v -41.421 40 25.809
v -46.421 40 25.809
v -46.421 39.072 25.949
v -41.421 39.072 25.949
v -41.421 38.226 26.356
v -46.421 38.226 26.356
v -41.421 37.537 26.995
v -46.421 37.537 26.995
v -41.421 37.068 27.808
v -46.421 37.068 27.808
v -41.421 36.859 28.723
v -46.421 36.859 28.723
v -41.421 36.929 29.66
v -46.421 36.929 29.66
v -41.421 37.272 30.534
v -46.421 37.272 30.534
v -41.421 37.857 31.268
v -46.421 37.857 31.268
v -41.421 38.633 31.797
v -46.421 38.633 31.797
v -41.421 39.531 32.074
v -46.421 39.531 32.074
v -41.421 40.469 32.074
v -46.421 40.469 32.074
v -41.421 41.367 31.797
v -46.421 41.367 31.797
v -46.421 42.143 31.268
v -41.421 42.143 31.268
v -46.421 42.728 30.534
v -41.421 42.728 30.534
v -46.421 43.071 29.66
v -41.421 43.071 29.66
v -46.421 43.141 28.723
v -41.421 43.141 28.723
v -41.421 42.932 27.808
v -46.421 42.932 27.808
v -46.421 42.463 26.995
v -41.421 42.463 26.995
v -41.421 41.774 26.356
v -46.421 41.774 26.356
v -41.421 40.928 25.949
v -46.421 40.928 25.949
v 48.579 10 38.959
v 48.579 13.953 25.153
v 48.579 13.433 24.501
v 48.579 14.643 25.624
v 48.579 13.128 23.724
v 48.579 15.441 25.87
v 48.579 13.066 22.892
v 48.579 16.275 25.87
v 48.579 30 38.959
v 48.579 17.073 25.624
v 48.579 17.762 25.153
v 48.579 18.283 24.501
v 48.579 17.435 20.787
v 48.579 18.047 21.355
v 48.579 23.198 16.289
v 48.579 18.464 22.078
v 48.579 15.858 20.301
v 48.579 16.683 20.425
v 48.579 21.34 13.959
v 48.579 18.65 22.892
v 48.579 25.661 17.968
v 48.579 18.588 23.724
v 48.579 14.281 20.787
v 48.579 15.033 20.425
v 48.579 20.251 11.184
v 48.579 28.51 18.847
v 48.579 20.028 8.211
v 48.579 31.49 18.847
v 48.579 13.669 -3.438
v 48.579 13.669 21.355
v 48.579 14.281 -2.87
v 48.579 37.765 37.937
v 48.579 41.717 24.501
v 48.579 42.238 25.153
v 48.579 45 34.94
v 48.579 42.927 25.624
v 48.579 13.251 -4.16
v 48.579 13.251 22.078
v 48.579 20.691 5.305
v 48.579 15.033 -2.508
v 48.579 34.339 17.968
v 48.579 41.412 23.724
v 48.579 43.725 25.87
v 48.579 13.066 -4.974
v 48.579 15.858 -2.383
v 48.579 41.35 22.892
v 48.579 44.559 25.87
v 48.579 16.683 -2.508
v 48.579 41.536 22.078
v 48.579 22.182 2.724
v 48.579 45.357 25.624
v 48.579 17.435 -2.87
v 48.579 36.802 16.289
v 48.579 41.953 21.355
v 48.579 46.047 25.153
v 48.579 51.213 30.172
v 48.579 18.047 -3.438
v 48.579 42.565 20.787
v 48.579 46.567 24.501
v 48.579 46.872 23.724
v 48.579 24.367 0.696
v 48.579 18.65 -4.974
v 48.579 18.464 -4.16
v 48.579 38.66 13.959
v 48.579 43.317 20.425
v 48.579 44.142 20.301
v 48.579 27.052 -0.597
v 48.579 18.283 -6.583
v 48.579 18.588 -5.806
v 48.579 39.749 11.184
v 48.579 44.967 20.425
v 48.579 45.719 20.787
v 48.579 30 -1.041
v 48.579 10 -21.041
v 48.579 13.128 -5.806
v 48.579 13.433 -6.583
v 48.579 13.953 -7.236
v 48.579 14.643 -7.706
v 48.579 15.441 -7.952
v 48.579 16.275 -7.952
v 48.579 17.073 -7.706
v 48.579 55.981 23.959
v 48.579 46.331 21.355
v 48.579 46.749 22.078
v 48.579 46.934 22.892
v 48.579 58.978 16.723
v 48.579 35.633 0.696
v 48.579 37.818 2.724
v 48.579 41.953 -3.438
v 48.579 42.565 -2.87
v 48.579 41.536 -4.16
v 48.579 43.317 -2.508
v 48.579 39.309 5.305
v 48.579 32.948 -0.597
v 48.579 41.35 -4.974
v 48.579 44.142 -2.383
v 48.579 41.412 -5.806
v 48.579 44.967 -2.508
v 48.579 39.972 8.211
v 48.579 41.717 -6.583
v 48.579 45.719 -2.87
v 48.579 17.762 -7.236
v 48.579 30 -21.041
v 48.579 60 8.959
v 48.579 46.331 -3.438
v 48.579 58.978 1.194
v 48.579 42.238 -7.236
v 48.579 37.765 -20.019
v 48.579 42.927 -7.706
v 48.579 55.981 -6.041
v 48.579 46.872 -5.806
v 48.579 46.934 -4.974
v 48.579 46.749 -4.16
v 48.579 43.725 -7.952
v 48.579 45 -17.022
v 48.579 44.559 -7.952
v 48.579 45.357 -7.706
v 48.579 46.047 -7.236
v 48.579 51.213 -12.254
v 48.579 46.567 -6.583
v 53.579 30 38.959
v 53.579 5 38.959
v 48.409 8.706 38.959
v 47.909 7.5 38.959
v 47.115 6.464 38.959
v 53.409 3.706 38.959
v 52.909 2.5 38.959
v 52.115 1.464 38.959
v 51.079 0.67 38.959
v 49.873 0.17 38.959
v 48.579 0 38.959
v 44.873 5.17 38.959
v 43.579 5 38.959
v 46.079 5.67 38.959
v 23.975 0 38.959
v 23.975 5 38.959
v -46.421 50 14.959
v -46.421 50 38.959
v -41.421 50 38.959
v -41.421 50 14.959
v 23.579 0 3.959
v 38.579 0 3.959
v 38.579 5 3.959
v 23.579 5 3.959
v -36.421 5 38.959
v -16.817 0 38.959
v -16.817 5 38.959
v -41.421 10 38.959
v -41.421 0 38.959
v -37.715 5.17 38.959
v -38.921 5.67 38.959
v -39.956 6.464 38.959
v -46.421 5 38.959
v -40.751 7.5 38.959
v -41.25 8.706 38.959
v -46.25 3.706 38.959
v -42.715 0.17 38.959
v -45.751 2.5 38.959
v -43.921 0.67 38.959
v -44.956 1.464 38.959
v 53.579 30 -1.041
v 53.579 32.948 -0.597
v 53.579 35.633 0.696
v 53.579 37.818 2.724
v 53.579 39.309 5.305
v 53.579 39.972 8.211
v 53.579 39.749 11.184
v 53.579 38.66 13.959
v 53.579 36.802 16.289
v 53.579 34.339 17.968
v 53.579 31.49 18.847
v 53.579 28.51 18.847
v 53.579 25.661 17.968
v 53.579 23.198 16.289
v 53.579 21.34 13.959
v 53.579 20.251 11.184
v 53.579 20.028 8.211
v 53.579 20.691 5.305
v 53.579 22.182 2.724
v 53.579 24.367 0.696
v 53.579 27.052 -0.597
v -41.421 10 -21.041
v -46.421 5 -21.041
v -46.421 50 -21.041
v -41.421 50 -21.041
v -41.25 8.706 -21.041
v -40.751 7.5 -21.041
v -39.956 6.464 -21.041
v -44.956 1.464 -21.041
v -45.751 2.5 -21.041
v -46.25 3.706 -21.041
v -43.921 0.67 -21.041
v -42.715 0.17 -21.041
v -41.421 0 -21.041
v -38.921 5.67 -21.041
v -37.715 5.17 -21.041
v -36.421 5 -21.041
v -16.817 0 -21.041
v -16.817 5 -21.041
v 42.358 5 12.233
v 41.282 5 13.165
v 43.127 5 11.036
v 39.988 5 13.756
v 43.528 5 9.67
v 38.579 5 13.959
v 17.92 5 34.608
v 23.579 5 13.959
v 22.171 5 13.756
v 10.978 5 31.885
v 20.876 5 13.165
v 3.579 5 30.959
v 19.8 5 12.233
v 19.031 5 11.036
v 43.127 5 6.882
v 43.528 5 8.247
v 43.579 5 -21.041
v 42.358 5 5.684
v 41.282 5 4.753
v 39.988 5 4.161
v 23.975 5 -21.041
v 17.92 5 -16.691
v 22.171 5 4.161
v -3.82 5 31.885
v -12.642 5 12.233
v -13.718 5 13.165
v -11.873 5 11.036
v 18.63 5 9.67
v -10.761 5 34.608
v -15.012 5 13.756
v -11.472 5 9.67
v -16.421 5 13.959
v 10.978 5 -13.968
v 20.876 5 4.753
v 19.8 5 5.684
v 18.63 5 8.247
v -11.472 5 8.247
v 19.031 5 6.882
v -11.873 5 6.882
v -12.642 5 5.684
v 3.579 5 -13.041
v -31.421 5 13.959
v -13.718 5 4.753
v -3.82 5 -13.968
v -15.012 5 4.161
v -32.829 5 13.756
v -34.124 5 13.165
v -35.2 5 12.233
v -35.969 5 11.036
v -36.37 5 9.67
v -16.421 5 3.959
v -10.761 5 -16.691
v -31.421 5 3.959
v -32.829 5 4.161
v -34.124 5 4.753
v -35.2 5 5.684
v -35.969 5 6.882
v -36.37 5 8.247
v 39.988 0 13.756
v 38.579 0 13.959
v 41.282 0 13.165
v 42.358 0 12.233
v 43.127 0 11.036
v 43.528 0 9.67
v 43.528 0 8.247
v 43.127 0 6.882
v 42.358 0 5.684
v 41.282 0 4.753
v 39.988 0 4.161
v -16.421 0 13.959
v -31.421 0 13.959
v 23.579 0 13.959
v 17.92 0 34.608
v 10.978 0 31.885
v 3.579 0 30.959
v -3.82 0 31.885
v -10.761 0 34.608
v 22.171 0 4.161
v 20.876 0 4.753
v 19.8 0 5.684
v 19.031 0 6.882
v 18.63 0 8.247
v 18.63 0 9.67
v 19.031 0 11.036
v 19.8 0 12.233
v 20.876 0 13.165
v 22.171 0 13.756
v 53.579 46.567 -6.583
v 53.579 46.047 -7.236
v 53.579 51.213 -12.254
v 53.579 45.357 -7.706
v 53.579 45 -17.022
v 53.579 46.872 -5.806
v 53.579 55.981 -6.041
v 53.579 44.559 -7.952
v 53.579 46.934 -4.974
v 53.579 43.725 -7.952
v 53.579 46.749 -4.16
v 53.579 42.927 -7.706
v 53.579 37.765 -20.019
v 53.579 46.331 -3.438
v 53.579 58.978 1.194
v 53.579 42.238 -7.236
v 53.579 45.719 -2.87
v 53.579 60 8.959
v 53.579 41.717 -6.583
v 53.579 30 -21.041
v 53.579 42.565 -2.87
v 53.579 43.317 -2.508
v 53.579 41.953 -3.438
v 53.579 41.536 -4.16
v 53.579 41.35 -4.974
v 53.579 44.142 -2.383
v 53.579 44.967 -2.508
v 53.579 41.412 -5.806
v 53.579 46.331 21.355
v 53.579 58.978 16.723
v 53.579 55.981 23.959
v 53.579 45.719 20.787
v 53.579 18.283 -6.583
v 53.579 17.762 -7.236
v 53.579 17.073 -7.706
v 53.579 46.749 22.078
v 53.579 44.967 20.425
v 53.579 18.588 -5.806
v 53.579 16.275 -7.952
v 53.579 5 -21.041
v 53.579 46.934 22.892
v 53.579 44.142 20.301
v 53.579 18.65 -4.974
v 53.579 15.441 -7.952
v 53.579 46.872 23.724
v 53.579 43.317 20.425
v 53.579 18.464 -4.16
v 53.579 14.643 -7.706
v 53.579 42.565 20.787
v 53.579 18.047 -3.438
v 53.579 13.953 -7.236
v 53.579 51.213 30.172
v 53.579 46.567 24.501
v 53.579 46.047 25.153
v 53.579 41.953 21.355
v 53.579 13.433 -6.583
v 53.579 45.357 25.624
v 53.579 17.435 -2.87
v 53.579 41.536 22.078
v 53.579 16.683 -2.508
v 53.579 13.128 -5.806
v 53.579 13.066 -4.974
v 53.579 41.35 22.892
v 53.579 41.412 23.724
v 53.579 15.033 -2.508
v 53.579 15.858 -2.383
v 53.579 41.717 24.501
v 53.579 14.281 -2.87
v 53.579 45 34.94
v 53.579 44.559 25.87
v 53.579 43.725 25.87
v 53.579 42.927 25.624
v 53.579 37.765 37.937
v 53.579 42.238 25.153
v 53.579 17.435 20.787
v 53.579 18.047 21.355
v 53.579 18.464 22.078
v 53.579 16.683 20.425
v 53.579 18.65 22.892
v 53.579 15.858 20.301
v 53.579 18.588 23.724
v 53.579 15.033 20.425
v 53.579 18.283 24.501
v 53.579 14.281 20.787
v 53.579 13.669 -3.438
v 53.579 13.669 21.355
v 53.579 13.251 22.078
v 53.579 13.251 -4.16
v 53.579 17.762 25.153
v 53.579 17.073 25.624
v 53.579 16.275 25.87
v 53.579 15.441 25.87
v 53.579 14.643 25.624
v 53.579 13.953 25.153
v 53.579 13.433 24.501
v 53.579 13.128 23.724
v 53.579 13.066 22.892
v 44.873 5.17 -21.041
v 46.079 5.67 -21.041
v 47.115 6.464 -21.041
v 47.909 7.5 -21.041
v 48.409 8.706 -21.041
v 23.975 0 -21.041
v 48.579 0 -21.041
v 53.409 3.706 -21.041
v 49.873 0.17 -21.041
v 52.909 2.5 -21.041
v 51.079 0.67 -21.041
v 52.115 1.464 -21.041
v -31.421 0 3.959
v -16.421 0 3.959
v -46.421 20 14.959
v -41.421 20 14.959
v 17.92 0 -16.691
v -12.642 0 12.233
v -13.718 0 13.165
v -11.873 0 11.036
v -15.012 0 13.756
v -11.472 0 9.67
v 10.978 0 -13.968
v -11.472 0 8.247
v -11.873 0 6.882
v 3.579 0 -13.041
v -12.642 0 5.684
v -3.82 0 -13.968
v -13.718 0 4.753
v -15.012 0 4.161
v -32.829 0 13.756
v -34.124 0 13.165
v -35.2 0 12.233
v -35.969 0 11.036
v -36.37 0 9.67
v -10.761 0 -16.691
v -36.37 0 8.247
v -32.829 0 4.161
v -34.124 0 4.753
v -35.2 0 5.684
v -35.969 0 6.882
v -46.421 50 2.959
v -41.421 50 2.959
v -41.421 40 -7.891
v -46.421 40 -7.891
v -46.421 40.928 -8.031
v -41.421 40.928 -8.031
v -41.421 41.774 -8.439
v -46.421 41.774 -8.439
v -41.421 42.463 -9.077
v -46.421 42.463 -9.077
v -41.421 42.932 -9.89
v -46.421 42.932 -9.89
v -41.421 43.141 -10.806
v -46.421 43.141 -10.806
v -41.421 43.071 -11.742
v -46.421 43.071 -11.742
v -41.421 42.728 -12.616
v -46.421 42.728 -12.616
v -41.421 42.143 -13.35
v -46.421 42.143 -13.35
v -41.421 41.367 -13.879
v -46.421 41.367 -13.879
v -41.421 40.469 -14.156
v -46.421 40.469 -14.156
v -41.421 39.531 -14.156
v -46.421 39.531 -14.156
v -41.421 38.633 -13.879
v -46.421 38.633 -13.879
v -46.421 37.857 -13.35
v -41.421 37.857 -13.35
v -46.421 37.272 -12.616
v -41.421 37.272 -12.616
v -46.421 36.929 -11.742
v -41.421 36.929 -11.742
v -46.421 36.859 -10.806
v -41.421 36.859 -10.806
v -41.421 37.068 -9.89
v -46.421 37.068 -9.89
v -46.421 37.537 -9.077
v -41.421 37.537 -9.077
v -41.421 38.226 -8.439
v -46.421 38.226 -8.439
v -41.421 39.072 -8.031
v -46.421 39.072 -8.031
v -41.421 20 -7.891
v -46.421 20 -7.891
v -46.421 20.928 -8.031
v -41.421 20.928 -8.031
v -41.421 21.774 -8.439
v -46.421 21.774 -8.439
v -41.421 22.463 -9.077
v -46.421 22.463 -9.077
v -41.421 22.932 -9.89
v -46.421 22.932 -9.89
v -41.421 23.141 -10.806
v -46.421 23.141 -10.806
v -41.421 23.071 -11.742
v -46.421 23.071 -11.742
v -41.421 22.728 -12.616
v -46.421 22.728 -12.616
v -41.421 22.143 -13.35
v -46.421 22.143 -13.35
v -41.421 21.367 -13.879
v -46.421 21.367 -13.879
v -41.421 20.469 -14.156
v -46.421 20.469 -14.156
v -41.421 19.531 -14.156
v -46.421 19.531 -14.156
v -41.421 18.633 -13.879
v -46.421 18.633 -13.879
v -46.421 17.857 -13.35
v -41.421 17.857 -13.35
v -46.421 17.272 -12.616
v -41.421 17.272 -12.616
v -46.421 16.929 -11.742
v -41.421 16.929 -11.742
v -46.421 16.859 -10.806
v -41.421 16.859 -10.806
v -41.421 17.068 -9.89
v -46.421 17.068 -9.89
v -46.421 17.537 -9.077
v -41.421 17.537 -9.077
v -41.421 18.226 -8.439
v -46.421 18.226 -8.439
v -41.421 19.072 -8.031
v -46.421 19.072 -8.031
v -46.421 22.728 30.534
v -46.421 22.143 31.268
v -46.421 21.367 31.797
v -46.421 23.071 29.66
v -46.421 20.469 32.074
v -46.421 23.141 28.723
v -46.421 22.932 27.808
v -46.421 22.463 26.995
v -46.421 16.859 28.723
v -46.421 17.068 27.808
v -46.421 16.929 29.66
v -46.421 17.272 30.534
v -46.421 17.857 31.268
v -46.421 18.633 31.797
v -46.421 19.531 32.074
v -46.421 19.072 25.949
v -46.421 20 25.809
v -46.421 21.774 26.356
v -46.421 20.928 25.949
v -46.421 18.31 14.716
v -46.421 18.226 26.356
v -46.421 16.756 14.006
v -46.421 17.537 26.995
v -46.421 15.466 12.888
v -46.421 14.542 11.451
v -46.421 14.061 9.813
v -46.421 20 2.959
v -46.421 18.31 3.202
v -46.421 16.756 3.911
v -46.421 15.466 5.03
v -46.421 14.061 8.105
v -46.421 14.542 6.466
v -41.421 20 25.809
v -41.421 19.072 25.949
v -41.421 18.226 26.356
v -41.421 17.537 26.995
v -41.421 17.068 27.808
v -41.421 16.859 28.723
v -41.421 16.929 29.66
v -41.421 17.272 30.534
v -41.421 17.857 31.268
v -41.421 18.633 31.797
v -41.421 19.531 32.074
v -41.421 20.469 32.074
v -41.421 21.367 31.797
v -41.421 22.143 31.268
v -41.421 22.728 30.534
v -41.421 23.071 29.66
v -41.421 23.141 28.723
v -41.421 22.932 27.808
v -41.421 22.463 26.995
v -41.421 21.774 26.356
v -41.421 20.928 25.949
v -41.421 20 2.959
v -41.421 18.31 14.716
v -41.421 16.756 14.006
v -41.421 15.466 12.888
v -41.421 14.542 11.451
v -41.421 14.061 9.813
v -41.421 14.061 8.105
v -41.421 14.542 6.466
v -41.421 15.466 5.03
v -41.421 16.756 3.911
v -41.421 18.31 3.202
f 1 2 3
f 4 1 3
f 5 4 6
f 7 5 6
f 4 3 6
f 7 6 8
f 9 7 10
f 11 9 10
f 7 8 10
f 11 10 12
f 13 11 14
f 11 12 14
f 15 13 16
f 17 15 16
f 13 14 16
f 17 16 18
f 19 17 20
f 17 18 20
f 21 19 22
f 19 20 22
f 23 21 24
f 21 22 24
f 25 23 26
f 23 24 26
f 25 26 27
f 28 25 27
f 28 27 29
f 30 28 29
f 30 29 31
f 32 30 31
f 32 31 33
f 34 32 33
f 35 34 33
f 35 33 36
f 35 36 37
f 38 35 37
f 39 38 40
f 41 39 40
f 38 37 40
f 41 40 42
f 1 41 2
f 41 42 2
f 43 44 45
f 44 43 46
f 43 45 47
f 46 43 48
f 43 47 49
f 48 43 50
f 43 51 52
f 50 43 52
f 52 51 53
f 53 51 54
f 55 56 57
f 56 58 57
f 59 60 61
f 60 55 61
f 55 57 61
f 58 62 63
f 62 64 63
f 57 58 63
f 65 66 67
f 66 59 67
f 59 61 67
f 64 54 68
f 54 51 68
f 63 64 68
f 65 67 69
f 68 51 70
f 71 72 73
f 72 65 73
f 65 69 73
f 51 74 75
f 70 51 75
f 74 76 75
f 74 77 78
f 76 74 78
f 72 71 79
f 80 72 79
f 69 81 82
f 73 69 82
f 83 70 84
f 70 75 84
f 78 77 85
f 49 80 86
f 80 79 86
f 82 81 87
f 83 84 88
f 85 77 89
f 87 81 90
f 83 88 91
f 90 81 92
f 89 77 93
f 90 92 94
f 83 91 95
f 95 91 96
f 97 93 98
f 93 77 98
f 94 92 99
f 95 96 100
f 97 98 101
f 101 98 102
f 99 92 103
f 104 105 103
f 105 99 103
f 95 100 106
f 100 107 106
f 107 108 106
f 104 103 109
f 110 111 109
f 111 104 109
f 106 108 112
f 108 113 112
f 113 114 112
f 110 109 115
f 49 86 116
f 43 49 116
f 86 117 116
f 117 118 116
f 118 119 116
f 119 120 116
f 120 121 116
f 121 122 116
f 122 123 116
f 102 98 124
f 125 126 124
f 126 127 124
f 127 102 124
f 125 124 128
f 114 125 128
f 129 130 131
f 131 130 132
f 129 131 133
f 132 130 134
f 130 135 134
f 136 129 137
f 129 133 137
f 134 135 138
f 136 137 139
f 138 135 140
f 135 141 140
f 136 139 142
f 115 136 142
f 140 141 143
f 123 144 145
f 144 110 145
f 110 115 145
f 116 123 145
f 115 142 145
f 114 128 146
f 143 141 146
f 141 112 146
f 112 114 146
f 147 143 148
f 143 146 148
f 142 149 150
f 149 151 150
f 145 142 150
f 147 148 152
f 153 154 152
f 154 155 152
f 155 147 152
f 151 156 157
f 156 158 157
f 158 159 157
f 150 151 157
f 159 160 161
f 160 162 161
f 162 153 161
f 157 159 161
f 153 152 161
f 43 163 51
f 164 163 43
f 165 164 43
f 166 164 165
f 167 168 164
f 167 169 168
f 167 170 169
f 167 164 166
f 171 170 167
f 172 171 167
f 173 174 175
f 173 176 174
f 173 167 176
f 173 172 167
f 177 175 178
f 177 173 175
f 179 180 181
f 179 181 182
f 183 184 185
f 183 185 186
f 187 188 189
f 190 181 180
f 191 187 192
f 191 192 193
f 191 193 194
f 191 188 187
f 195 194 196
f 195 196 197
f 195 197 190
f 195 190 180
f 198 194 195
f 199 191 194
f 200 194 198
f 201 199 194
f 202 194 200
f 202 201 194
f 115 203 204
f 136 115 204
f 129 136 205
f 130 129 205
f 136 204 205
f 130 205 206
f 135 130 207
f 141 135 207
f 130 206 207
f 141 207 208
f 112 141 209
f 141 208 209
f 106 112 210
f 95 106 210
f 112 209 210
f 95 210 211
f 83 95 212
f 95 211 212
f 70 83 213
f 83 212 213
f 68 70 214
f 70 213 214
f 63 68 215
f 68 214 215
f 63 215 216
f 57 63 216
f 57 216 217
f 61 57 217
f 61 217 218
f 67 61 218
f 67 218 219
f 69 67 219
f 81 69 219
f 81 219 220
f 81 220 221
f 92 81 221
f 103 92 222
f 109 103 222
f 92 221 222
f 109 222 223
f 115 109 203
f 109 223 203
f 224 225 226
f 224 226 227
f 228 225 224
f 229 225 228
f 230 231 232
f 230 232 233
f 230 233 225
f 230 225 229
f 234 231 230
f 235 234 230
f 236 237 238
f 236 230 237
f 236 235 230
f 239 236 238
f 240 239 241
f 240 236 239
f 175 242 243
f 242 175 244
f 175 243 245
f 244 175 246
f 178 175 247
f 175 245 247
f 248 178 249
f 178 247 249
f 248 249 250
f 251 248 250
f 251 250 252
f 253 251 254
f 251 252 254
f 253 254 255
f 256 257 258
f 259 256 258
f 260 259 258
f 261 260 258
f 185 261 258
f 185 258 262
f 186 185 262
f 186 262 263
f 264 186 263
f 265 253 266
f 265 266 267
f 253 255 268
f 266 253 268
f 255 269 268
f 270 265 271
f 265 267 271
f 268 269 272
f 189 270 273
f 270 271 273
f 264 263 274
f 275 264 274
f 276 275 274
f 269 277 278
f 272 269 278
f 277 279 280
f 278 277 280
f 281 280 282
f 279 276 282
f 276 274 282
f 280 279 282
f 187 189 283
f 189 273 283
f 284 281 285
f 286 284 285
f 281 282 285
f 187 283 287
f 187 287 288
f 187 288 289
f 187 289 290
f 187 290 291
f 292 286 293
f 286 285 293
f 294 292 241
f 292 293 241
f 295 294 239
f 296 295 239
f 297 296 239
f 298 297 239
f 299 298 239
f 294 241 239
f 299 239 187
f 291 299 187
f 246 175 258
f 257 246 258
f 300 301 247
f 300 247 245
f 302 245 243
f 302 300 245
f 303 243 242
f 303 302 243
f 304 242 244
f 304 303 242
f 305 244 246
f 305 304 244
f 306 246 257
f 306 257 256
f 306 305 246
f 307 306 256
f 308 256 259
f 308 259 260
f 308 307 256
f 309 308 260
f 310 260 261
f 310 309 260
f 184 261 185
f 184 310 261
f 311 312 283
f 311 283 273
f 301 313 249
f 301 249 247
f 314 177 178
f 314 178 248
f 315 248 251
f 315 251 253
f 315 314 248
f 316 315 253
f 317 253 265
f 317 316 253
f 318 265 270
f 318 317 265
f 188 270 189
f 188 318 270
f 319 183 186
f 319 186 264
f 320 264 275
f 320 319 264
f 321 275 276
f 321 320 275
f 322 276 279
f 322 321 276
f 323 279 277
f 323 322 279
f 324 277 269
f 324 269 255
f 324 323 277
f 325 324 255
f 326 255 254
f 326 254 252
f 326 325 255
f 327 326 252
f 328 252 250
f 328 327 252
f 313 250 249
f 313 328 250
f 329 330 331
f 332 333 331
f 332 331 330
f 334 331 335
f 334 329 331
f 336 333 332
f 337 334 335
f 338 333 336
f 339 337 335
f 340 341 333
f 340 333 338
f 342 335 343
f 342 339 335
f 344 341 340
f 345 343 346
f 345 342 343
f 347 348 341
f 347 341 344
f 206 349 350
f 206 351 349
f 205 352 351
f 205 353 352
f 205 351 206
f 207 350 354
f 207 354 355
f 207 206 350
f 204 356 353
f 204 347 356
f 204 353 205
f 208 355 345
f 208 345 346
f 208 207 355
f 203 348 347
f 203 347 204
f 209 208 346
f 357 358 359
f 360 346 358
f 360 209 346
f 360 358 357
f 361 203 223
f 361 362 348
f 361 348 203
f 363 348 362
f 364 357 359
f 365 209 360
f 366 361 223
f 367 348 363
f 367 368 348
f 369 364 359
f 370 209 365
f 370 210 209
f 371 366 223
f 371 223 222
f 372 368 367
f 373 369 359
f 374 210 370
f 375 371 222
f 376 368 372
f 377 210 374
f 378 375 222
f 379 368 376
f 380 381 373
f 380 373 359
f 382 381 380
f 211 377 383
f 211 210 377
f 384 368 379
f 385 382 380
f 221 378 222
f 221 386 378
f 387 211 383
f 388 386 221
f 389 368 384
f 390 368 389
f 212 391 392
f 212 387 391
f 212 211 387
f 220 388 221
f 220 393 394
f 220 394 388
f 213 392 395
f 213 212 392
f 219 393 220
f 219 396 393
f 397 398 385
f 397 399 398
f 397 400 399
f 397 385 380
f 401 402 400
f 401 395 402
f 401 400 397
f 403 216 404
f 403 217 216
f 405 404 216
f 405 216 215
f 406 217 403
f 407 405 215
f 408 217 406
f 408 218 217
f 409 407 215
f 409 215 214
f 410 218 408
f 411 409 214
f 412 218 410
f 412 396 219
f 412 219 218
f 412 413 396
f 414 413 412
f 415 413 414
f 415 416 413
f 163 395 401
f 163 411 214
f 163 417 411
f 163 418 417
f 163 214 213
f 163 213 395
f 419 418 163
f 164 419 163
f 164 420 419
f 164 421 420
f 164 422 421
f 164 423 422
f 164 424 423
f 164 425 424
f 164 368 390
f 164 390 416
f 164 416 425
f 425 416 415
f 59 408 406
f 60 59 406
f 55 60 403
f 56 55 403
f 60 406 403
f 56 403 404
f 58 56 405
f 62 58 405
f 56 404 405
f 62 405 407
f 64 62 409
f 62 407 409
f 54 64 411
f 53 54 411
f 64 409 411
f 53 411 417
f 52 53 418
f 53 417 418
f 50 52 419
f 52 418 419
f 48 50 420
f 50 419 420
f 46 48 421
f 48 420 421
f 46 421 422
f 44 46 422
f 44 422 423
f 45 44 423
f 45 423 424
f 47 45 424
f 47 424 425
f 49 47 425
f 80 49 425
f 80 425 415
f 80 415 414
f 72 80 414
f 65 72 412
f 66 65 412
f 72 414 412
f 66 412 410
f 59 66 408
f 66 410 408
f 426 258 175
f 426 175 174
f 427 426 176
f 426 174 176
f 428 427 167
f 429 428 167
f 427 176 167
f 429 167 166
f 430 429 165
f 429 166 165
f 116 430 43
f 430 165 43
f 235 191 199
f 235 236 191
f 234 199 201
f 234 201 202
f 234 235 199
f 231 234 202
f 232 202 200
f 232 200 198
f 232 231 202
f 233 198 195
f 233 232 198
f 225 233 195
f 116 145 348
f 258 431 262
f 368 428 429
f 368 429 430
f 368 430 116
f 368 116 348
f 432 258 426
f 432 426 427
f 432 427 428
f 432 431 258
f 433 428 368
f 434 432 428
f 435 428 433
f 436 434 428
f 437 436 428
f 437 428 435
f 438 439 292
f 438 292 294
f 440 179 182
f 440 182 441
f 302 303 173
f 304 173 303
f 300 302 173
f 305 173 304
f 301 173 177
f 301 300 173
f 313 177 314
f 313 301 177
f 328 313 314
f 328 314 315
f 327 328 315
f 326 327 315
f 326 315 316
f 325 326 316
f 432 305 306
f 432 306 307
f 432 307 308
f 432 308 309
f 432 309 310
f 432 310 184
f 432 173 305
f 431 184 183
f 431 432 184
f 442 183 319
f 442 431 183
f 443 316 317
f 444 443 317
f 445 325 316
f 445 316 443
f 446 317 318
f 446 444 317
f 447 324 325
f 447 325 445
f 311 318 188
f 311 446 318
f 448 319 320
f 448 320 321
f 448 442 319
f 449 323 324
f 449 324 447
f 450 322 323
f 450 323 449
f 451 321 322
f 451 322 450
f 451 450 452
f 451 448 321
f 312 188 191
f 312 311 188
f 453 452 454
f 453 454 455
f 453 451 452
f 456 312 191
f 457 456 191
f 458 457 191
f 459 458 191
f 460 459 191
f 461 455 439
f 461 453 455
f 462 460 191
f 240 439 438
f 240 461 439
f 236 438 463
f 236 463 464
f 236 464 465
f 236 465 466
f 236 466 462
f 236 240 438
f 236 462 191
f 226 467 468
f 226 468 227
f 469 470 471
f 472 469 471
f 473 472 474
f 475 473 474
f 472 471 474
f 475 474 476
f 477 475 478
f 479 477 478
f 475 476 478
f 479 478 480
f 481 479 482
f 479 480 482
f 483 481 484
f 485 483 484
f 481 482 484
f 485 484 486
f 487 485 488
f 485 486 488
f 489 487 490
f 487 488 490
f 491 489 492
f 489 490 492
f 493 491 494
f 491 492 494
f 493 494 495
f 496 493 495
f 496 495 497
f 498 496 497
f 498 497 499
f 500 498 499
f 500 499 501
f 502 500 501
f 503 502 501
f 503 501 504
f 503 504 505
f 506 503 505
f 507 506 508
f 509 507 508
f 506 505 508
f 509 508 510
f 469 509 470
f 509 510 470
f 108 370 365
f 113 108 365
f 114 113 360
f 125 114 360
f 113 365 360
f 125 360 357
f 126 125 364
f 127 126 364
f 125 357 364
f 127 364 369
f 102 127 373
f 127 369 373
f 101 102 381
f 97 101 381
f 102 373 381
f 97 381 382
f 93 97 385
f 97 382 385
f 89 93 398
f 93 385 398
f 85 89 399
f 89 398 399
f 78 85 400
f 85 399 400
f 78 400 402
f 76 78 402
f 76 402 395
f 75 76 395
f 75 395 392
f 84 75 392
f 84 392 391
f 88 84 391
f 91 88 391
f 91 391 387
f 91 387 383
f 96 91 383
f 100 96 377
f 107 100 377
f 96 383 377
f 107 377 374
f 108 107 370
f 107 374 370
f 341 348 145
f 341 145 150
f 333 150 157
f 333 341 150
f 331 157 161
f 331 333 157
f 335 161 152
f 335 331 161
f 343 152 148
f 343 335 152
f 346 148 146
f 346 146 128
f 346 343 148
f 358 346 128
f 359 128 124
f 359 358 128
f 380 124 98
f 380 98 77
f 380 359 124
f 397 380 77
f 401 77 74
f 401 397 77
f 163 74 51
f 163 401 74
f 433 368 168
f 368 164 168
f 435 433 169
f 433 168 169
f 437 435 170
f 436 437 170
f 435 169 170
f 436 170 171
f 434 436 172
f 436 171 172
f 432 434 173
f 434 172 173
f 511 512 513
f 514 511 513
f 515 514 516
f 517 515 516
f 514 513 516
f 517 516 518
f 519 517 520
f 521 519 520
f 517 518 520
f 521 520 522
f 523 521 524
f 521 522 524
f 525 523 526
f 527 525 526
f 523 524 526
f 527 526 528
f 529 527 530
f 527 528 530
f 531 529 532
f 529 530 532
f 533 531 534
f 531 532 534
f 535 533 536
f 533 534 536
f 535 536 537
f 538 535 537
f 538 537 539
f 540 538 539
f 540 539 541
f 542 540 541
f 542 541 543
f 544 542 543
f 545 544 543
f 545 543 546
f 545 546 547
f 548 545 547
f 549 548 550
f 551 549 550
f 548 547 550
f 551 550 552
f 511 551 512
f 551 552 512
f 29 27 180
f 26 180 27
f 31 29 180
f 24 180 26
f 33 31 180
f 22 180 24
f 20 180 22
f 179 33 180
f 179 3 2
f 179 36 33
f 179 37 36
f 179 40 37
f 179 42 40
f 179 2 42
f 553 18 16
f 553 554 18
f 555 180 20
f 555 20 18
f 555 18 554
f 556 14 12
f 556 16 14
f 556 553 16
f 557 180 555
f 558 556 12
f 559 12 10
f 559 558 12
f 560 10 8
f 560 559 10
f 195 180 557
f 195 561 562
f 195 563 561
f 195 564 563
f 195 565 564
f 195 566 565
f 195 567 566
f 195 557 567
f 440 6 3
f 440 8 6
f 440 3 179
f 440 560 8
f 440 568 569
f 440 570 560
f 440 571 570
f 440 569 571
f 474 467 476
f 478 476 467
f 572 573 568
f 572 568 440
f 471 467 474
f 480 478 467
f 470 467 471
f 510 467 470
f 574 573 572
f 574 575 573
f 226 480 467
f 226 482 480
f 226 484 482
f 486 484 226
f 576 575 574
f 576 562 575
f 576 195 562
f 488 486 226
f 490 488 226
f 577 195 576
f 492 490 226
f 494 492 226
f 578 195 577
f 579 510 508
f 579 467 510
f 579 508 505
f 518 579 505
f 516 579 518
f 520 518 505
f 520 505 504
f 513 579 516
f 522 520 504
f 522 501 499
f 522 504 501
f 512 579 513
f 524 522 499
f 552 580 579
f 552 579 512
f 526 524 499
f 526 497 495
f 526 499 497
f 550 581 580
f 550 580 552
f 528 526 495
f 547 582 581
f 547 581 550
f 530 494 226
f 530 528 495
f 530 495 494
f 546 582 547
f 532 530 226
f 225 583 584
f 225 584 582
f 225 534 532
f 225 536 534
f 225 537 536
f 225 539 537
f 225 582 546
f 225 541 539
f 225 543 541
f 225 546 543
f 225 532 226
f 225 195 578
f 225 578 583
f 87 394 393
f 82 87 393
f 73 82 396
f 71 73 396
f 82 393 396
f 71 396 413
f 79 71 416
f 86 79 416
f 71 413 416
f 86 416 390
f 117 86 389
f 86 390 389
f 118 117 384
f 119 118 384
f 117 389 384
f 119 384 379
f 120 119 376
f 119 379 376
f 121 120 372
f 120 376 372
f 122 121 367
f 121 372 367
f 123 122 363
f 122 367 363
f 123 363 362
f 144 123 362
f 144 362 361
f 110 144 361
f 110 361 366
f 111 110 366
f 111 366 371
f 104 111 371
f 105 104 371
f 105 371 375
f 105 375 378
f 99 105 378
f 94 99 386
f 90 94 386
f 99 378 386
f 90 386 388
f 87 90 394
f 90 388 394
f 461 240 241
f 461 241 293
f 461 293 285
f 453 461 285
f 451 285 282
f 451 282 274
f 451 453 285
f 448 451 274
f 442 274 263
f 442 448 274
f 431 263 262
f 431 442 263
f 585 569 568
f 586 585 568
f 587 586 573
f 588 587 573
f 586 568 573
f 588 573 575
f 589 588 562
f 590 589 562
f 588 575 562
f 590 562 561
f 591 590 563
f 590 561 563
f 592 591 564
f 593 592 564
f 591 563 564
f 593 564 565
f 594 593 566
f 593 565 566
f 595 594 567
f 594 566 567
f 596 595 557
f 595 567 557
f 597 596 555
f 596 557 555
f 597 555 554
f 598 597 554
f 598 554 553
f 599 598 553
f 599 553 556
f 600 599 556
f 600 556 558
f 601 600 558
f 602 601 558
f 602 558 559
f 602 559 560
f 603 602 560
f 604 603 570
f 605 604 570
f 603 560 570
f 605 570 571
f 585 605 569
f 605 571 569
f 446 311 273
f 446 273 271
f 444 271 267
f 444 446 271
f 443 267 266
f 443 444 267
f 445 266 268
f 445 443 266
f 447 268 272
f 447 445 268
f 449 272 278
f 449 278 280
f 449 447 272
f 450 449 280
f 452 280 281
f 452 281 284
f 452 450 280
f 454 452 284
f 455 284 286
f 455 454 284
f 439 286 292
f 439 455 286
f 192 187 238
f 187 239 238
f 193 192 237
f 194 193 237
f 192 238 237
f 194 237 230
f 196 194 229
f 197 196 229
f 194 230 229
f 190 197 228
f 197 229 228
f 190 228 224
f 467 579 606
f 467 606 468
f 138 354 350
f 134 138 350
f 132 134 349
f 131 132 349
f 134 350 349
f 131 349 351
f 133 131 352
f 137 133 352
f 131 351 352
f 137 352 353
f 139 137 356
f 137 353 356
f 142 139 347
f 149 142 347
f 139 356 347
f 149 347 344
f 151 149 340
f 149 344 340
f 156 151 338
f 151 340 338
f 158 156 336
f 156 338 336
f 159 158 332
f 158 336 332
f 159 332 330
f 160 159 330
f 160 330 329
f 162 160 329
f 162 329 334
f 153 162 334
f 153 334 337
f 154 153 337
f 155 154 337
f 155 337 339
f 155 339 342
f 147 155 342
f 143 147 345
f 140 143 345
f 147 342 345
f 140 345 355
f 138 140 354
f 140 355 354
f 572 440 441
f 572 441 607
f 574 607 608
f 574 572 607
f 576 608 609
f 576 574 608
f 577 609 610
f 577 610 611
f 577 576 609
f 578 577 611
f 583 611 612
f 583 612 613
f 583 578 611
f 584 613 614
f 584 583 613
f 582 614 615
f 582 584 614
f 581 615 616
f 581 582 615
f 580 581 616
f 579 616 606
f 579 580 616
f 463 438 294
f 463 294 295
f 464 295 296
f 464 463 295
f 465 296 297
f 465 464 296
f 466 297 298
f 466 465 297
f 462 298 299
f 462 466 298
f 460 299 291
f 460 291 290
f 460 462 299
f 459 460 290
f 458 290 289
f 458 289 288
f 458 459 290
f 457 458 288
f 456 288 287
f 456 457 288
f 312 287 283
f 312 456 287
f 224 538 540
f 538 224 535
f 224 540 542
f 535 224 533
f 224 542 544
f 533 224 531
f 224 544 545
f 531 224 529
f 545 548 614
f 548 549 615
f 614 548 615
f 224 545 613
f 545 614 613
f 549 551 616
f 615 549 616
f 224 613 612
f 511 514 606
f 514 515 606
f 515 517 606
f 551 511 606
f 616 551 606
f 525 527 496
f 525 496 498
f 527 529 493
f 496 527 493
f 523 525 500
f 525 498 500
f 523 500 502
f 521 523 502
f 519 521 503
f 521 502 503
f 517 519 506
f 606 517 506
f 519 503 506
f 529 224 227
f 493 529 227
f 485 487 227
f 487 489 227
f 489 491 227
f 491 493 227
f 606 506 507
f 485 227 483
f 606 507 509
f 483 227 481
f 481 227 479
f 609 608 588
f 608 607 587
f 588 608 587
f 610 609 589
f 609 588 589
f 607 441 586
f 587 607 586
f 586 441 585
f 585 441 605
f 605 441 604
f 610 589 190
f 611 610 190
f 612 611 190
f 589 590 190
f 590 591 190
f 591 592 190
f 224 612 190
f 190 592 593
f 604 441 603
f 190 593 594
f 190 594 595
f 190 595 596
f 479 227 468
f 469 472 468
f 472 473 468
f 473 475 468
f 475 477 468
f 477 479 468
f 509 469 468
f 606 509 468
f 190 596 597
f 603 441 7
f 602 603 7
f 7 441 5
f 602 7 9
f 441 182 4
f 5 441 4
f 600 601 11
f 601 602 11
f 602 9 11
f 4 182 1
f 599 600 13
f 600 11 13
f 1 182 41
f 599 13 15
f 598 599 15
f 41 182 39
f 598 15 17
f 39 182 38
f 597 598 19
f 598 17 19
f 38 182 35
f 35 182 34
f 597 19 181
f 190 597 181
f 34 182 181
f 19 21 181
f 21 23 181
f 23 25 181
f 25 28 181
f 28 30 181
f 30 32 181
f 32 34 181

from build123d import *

# Parameters (mm, degrees)
SALIENTE_EXTRUIR1_DEPTH = 5
CROQUIS2_R              = 10.000000000000002
CROQUIS2_R_2            = 2.7999999999999976
CROQUIS2_R_3            = 2.800000000000002
SALIENTE_EXTRUIR2_DEPTH = 5
CROQUIS3_R              = 3.149999999999999
CROQUIS3_R_2            = 3.1499999999999972
SALIENTE_EXTRUIR3_DEPTH = 5
REDONDEO1_R             = 5
REDONDEO2_R             = 5
REDONDEO3_R             = 5
REDONDEO4_R             = 5


with BuildPart() as part:
    # Croquis1 → Saliente-Extruir1 (new body)
    with BuildSketch(Plane(origin=(0, 0, 0), x_dir=(1, 0, 0), z_dir=(0, 1, 0))):
        with BuildLine():
            Line((-46.42082429501085, 21.041214750542295), (-16.81690234938199, 21.041214750542295))
            ThreePointArc((-16.81690234938199, 21.041214750542295), (3.579175704989149, 13.041214750542295), (23.975253759360285, 21.041214750542295))
            Line((23.975253759360285, 21.041214750542295), (53.57917570498915, 21.041214750542295))
            Line((53.57917570498915, 21.041214750542295), (53.57917570498915, -38.9587852494577))
            Line((53.57917570498915, -38.9587852494577), (23.975253759360285, -38.9587852494577))
            ThreePointArc((23.975253759360285, -38.9587852494577), (3.579175704989149, -30.958785249457698), (-16.81690234938199, -38.9587852494577))
            Line((-16.81690234938199, -38.9587852494577), (-46.420824295010846, -38.9587852494577))
            Line((-46.420824295010846, -38.9587852494577), (-46.42082429501085, 21.041214750542295))
        make_face()
        with BuildLine():
            Line((-16.42082429501085, -3.958785249457704), (-31.42082429501085, -3.9587852494577107))
            ThreePointArc((-31.42082429501085, -3.9587852494577107), (-36.420824295010846, -8.958785249457705), (-31.42082429501085, -13.9587852494577))
            Line((-31.42082429501085, -13.9587852494577), (-16.42082429501085, -13.958785249457705))
            ThreePointArc((-16.42082429501085, -13.958785249457705), (-11.42082429501085, -8.958785249457705), (-16.42082429501085, -3.958785249457704))
        make_face(mode=Mode.SUBTRACT)
        with BuildLine():
            Line((23.579175704989144, -13.958785249457705), (38.57917570498914, -13.9587852494577))
            ThreePointArc((38.57917570498914, -13.9587852494577), (43.57917570498913, -8.958785249457705), (38.57917570498914, -3.9587852494577107))
            Line((38.57917570498914, -3.9587852494577107), (23.579175704989144, -3.958785249457704))
            ThreePointArc((23.579175704989144, -3.958785249457704), (18.579175704989144, -8.958785249457705), (23.579175704989144, -13.958785249457705))
        make_face(mode=Mode.SUBTRACT)
    extrude(amount=SALIENTE_EXTRUIR1_DEPTH)

    # Croquis2 → Saliente-Extruir2 (add)
    with BuildSketch(Plane(origin=(53.57917570498915, 0, 0), x_dir=(0, 0, -1), z_dir=(1, 0, 0))):
        with BuildLine():
            Line((-38.9587852494577, 0), (21.0412147505423, 0))
            Line((21.0412147505423, 0), (21.0412147505423, 30))
            ThreePointArc((21.0412147505423, 30), (-8.9587852494577, 60), (-38.9587852494577, 30))
            Line((-38.9587852494577, 30), (-38.9587852494577, 0))
        make_face()
        with Locations((-8.958785249457701, 30)):
            Circle(CROQUIS2_R, mode=Mode.SUBTRACT)
        with Locations((-23.10092087318865, 44.14213562373096)):
            Circle(CROQUIS2_R_2, mode=Mode.SUBTRACT)
        with Locations((-23.100920873188652, 15.85786437626905)):
            Circle(CROQUIS2_R_3, mode=Mode.SUBTRACT)
        with Locations(Location((5.183350374273251, 15.85786437626905, 0), (0, 0, 180))):
            Circle(CROQUIS2_R_3, mode=Mode.SUBTRACT)
        with Locations(Location((5.183350374273248, 44.14213562373096, 0), (0, 0, 180))):
            Circle(CROQUIS2_R_2, mode=Mode.SUBTRACT)
    extrude(amount=-SALIENTE_EXTRUIR2_DEPTH)

    # Croquis3 → Saliente-Extruir3 (add)
    with BuildSketch(Plane.ZY.offset(46.42082429501085)):
        with BuildLine():
            Line((-21.041214750542302, 0), (38.9587852494577, 0))
            Line((38.9587852494577, 0), (38.9587852494577, 50))
            Line((38.9587852494577, 50), (14.958785249457705, 50))
            Line((14.958785249457705, 50), (14.958785249457707, 20.000000000000004))
            ThreePointArc((14.958785249457707, 20.000000000000004), (8.958785249457703, 14.000000000000004), (2.958785249457704, 20.000000000000004))
            Line((2.958785249457704, 20.000000000000004), (2.9587852494577036, 50))
            Line((2.9587852494577036, 50), (-21.041214750542302, 50))
            Line((-21.041214750542302, 50), (-21.041214750542302, 0))
        make_face()
        with Locations((-11.041214750542295, 19.999999999999996)):
            Circle(CROQUIS3_R, mode=Mode.SUBTRACT)
        with Locations((-11.041214750542295, 39.99999999999999)):
            Circle(CROQUIS3_R, mode=Mode.SUBTRACT)
        with Locations(Location((28.958785249457705, 20.000000000000004, 0), (0, 0, 180))):
            Circle(CROQUIS3_R, mode=Mode.SUBTRACT)
        with Locations(Location((28.958785249457698, 40.00000000000001, 0), (0, 0, 180))):
            Circle(CROQUIS3_R_2, mode=Mode.SUBTRACT)
    extrude(amount=-SALIENTE_EXTRUIR3_DEPTH)

    # Redondeo1
    redondeo1_edges = [part.edges().sort_by_distance(p)[0] for p in [
        (-41.42082429501085, 5, 8.9587852494577),
    ]]
    fillet(redondeo1_edges, radius=REDONDEO1_R)

    # Redondeo2
    redondeo2_edges = [part.edges().sort_by_distance(p)[0] for p in [
        (48.57917570498915, 5, 8.958785249457703),
    ]]
    fillet(redondeo2_edges, radius=REDONDEO2_R)

    # Redondeo3
    redondeo3_edges = [part.edges().sort_by_distance(p)[0] for p in [
        (53.57917570498915, 0, 8.958785249457701),
    ]]
    fillet(redondeo3_edges, radius=REDONDEO3_R)

    # Redondeo4
    redondeo4_edges = [part.edges().sort_by_distance(p)[0] for p in [
        (-46.420824295010846, 0, 8.958785249457701),
    ]]
    fillet(redondeo4_edges, radius=REDONDEO4_R)


solid = part.part
